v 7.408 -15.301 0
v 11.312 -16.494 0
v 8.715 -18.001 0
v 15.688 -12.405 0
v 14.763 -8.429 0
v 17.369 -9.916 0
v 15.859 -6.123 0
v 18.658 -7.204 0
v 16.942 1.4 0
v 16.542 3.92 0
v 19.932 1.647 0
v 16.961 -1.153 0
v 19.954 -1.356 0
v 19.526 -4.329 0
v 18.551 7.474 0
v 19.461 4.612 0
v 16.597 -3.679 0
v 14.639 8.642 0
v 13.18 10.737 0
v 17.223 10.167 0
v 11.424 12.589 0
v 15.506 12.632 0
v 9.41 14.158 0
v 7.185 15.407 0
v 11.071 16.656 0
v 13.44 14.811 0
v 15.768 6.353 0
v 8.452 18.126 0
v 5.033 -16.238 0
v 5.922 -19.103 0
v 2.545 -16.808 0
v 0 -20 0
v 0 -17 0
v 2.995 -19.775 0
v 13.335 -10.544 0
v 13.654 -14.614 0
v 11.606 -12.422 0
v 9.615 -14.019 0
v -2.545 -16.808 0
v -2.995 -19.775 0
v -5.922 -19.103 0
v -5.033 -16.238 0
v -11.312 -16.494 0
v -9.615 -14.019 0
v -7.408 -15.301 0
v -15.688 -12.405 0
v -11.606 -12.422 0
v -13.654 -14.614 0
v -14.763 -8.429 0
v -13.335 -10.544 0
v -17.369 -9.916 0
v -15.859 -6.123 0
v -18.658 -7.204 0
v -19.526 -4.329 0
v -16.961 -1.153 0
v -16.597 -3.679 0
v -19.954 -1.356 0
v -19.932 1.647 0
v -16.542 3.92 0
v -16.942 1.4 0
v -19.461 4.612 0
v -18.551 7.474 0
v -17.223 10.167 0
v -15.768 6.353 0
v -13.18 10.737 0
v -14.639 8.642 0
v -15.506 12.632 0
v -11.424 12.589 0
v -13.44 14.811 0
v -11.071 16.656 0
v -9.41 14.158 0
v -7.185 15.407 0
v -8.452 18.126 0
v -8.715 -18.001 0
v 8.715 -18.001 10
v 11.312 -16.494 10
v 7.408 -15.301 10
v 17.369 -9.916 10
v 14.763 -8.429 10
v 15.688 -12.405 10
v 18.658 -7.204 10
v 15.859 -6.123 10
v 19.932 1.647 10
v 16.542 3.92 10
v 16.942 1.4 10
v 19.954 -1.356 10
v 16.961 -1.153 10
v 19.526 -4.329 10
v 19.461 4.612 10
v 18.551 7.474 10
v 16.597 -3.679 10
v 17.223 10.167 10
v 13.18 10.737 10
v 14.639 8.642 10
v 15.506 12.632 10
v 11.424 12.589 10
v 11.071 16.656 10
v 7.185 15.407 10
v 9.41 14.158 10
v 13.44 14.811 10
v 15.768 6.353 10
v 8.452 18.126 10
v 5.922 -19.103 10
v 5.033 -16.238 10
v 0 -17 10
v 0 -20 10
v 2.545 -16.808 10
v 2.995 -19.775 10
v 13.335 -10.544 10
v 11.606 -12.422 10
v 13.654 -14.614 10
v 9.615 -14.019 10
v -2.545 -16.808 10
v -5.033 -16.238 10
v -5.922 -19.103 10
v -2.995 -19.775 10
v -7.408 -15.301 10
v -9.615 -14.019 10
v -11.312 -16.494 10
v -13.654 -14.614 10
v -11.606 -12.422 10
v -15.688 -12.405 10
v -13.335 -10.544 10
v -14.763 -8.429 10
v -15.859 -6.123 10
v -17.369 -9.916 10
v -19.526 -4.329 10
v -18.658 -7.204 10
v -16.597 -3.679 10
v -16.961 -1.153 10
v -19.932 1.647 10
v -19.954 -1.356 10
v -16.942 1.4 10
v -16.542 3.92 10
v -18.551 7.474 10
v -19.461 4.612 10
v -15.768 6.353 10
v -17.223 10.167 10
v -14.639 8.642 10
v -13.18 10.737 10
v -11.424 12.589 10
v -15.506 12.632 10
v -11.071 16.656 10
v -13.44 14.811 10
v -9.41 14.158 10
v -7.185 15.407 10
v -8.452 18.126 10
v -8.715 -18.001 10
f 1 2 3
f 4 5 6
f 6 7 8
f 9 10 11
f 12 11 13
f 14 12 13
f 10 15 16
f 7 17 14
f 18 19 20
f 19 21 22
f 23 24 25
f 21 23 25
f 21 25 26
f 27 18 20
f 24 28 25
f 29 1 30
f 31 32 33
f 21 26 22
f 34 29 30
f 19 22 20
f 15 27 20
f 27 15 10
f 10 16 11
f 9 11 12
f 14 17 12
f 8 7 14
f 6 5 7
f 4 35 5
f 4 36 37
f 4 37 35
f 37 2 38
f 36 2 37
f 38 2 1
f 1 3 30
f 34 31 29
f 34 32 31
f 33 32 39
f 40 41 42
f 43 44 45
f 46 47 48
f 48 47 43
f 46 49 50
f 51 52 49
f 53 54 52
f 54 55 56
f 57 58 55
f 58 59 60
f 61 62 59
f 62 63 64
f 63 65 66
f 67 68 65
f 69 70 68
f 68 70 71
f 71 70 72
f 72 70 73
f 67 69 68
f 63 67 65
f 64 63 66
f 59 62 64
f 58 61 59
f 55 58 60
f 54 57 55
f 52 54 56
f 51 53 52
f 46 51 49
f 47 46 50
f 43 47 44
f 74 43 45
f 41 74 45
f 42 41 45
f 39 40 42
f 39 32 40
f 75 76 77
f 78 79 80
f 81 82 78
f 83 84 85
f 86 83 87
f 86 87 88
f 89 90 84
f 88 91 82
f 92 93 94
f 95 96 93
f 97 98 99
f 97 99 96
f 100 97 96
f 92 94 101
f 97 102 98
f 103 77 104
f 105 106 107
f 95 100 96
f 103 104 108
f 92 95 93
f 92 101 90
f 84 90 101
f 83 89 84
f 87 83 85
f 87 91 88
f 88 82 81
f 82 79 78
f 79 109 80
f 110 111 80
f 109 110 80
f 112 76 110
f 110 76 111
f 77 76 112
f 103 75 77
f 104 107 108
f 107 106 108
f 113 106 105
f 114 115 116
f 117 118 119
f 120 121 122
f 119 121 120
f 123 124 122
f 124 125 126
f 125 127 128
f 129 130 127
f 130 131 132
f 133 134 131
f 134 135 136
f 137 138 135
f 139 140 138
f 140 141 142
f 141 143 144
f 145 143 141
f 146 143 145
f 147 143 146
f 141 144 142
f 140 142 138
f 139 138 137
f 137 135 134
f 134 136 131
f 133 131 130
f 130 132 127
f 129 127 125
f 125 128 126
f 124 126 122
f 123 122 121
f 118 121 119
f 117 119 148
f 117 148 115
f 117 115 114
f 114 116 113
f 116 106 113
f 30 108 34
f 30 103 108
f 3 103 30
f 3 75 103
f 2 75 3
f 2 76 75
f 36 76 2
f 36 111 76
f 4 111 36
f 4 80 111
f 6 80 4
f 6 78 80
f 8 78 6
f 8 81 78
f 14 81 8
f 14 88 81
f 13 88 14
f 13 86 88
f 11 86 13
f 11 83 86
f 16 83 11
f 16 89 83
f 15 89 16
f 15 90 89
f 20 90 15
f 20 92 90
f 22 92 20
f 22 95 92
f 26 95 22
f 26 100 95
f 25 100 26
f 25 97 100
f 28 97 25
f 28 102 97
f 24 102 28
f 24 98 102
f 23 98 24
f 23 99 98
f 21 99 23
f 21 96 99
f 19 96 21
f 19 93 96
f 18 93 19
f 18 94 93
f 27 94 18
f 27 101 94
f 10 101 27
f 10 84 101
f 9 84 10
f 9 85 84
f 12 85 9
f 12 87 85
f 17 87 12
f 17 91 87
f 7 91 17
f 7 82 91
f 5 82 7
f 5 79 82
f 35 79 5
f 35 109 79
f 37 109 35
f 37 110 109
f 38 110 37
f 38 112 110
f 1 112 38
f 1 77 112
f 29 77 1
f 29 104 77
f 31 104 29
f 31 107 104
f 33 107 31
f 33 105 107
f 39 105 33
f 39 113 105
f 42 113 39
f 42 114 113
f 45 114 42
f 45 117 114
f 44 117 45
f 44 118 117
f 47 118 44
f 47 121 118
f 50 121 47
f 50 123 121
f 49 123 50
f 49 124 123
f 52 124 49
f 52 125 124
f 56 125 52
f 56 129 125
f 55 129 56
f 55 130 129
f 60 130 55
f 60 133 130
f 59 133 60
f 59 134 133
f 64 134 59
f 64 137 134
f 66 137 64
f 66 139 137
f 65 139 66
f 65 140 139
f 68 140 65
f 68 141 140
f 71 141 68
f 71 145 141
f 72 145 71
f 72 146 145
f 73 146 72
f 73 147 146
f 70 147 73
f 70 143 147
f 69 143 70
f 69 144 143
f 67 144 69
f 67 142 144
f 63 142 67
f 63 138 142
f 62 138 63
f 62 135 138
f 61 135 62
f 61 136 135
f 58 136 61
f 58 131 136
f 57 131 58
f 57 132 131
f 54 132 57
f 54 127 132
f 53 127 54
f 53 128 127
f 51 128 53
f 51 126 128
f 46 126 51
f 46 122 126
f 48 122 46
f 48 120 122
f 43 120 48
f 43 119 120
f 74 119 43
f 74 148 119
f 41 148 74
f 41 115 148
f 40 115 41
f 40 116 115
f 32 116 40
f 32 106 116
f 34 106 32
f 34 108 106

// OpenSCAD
$fn = 32;
// ----------------------------------------------------------------------
// Spring clip: 40 mm outside, 3 mm band, 50 degree opening
// ----------------------------------------------------------------------

// --- parameters (mm) ---
outer_r = 20;             // clip outside radius
inner_r = 17;             // clip bore radius
band = 3;                 // band thickness
clip_w = 10;              // clip width
opening = 50;             // opening angle

clip_profile = [[-8.452, 18.126], [-11.071, 16.656], [-13.44, 14.811], [-15.506, 12.632], [-17.223, 10.167], [-18.551, 7.474], [-19.461, 4.612], [-19.932, 1.647], [-19.954, -1.356], [-19.526, -4.329], [-18.658, -7.204], [-17.369, -9.916], [-15.688, -12.405], [-13.654, -14.614], [-11.312, -16.494], [-8.715, -18.001], [-5.922, -19.103], [-2.995, -19.775], [0, -20], [2.995, -19.775], [5.922, -19.103], [8.715, -18.001], [11.312, -16.494], [13.654, -14.614], [15.688, -12.405], [17.369, -9.916], [18.658, -7.204], [19.526, -4.329], [19.954, -1.356], [19.932, 1.647], [19.461, 4.612], [18.551, 7.474], [17.223, 10.167], [15.506, 12.632], [13.44, 14.811], [11.071, 16.656], [8.452, 18.126], [7.185, 15.407], [9.41, 14.158], [11.424, 12.589], [13.18, 10.737], [14.639, 8.642], [15.768, 6.353], [16.542, 3.92], [16.942, 1.4], [16.961, -1.153], [16.597, -3.679], [15.859, -6.123], [14.763, -8.429], [13.335, -10.544], [11.606, -12.422], [9.615, -14.019], [7.408, -15.301], [5.033, -16.238], [2.545, -16.808], [0, -17], [-2.545, -16.808], [-5.033, -16.238], [-7.408, -15.301], [-9.615, -14.019], [-11.606, -12.422], [-13.335, -10.544], [-14.763, -8.429], [-15.859, -6.123], [-16.597, -3.679], [-16.961, -1.153], [-16.942, 1.4], [-16.542, 3.92], [-15.768, 6.353], [-14.639, 8.642], [-13.18, 10.737], [-11.424, 12.589], [-9.41, 14.158], [-7.185, 15.407]];

difference() {
  union() {
    linear_extrude(height = clip_w) polygon(clip_profile);
  }
}
